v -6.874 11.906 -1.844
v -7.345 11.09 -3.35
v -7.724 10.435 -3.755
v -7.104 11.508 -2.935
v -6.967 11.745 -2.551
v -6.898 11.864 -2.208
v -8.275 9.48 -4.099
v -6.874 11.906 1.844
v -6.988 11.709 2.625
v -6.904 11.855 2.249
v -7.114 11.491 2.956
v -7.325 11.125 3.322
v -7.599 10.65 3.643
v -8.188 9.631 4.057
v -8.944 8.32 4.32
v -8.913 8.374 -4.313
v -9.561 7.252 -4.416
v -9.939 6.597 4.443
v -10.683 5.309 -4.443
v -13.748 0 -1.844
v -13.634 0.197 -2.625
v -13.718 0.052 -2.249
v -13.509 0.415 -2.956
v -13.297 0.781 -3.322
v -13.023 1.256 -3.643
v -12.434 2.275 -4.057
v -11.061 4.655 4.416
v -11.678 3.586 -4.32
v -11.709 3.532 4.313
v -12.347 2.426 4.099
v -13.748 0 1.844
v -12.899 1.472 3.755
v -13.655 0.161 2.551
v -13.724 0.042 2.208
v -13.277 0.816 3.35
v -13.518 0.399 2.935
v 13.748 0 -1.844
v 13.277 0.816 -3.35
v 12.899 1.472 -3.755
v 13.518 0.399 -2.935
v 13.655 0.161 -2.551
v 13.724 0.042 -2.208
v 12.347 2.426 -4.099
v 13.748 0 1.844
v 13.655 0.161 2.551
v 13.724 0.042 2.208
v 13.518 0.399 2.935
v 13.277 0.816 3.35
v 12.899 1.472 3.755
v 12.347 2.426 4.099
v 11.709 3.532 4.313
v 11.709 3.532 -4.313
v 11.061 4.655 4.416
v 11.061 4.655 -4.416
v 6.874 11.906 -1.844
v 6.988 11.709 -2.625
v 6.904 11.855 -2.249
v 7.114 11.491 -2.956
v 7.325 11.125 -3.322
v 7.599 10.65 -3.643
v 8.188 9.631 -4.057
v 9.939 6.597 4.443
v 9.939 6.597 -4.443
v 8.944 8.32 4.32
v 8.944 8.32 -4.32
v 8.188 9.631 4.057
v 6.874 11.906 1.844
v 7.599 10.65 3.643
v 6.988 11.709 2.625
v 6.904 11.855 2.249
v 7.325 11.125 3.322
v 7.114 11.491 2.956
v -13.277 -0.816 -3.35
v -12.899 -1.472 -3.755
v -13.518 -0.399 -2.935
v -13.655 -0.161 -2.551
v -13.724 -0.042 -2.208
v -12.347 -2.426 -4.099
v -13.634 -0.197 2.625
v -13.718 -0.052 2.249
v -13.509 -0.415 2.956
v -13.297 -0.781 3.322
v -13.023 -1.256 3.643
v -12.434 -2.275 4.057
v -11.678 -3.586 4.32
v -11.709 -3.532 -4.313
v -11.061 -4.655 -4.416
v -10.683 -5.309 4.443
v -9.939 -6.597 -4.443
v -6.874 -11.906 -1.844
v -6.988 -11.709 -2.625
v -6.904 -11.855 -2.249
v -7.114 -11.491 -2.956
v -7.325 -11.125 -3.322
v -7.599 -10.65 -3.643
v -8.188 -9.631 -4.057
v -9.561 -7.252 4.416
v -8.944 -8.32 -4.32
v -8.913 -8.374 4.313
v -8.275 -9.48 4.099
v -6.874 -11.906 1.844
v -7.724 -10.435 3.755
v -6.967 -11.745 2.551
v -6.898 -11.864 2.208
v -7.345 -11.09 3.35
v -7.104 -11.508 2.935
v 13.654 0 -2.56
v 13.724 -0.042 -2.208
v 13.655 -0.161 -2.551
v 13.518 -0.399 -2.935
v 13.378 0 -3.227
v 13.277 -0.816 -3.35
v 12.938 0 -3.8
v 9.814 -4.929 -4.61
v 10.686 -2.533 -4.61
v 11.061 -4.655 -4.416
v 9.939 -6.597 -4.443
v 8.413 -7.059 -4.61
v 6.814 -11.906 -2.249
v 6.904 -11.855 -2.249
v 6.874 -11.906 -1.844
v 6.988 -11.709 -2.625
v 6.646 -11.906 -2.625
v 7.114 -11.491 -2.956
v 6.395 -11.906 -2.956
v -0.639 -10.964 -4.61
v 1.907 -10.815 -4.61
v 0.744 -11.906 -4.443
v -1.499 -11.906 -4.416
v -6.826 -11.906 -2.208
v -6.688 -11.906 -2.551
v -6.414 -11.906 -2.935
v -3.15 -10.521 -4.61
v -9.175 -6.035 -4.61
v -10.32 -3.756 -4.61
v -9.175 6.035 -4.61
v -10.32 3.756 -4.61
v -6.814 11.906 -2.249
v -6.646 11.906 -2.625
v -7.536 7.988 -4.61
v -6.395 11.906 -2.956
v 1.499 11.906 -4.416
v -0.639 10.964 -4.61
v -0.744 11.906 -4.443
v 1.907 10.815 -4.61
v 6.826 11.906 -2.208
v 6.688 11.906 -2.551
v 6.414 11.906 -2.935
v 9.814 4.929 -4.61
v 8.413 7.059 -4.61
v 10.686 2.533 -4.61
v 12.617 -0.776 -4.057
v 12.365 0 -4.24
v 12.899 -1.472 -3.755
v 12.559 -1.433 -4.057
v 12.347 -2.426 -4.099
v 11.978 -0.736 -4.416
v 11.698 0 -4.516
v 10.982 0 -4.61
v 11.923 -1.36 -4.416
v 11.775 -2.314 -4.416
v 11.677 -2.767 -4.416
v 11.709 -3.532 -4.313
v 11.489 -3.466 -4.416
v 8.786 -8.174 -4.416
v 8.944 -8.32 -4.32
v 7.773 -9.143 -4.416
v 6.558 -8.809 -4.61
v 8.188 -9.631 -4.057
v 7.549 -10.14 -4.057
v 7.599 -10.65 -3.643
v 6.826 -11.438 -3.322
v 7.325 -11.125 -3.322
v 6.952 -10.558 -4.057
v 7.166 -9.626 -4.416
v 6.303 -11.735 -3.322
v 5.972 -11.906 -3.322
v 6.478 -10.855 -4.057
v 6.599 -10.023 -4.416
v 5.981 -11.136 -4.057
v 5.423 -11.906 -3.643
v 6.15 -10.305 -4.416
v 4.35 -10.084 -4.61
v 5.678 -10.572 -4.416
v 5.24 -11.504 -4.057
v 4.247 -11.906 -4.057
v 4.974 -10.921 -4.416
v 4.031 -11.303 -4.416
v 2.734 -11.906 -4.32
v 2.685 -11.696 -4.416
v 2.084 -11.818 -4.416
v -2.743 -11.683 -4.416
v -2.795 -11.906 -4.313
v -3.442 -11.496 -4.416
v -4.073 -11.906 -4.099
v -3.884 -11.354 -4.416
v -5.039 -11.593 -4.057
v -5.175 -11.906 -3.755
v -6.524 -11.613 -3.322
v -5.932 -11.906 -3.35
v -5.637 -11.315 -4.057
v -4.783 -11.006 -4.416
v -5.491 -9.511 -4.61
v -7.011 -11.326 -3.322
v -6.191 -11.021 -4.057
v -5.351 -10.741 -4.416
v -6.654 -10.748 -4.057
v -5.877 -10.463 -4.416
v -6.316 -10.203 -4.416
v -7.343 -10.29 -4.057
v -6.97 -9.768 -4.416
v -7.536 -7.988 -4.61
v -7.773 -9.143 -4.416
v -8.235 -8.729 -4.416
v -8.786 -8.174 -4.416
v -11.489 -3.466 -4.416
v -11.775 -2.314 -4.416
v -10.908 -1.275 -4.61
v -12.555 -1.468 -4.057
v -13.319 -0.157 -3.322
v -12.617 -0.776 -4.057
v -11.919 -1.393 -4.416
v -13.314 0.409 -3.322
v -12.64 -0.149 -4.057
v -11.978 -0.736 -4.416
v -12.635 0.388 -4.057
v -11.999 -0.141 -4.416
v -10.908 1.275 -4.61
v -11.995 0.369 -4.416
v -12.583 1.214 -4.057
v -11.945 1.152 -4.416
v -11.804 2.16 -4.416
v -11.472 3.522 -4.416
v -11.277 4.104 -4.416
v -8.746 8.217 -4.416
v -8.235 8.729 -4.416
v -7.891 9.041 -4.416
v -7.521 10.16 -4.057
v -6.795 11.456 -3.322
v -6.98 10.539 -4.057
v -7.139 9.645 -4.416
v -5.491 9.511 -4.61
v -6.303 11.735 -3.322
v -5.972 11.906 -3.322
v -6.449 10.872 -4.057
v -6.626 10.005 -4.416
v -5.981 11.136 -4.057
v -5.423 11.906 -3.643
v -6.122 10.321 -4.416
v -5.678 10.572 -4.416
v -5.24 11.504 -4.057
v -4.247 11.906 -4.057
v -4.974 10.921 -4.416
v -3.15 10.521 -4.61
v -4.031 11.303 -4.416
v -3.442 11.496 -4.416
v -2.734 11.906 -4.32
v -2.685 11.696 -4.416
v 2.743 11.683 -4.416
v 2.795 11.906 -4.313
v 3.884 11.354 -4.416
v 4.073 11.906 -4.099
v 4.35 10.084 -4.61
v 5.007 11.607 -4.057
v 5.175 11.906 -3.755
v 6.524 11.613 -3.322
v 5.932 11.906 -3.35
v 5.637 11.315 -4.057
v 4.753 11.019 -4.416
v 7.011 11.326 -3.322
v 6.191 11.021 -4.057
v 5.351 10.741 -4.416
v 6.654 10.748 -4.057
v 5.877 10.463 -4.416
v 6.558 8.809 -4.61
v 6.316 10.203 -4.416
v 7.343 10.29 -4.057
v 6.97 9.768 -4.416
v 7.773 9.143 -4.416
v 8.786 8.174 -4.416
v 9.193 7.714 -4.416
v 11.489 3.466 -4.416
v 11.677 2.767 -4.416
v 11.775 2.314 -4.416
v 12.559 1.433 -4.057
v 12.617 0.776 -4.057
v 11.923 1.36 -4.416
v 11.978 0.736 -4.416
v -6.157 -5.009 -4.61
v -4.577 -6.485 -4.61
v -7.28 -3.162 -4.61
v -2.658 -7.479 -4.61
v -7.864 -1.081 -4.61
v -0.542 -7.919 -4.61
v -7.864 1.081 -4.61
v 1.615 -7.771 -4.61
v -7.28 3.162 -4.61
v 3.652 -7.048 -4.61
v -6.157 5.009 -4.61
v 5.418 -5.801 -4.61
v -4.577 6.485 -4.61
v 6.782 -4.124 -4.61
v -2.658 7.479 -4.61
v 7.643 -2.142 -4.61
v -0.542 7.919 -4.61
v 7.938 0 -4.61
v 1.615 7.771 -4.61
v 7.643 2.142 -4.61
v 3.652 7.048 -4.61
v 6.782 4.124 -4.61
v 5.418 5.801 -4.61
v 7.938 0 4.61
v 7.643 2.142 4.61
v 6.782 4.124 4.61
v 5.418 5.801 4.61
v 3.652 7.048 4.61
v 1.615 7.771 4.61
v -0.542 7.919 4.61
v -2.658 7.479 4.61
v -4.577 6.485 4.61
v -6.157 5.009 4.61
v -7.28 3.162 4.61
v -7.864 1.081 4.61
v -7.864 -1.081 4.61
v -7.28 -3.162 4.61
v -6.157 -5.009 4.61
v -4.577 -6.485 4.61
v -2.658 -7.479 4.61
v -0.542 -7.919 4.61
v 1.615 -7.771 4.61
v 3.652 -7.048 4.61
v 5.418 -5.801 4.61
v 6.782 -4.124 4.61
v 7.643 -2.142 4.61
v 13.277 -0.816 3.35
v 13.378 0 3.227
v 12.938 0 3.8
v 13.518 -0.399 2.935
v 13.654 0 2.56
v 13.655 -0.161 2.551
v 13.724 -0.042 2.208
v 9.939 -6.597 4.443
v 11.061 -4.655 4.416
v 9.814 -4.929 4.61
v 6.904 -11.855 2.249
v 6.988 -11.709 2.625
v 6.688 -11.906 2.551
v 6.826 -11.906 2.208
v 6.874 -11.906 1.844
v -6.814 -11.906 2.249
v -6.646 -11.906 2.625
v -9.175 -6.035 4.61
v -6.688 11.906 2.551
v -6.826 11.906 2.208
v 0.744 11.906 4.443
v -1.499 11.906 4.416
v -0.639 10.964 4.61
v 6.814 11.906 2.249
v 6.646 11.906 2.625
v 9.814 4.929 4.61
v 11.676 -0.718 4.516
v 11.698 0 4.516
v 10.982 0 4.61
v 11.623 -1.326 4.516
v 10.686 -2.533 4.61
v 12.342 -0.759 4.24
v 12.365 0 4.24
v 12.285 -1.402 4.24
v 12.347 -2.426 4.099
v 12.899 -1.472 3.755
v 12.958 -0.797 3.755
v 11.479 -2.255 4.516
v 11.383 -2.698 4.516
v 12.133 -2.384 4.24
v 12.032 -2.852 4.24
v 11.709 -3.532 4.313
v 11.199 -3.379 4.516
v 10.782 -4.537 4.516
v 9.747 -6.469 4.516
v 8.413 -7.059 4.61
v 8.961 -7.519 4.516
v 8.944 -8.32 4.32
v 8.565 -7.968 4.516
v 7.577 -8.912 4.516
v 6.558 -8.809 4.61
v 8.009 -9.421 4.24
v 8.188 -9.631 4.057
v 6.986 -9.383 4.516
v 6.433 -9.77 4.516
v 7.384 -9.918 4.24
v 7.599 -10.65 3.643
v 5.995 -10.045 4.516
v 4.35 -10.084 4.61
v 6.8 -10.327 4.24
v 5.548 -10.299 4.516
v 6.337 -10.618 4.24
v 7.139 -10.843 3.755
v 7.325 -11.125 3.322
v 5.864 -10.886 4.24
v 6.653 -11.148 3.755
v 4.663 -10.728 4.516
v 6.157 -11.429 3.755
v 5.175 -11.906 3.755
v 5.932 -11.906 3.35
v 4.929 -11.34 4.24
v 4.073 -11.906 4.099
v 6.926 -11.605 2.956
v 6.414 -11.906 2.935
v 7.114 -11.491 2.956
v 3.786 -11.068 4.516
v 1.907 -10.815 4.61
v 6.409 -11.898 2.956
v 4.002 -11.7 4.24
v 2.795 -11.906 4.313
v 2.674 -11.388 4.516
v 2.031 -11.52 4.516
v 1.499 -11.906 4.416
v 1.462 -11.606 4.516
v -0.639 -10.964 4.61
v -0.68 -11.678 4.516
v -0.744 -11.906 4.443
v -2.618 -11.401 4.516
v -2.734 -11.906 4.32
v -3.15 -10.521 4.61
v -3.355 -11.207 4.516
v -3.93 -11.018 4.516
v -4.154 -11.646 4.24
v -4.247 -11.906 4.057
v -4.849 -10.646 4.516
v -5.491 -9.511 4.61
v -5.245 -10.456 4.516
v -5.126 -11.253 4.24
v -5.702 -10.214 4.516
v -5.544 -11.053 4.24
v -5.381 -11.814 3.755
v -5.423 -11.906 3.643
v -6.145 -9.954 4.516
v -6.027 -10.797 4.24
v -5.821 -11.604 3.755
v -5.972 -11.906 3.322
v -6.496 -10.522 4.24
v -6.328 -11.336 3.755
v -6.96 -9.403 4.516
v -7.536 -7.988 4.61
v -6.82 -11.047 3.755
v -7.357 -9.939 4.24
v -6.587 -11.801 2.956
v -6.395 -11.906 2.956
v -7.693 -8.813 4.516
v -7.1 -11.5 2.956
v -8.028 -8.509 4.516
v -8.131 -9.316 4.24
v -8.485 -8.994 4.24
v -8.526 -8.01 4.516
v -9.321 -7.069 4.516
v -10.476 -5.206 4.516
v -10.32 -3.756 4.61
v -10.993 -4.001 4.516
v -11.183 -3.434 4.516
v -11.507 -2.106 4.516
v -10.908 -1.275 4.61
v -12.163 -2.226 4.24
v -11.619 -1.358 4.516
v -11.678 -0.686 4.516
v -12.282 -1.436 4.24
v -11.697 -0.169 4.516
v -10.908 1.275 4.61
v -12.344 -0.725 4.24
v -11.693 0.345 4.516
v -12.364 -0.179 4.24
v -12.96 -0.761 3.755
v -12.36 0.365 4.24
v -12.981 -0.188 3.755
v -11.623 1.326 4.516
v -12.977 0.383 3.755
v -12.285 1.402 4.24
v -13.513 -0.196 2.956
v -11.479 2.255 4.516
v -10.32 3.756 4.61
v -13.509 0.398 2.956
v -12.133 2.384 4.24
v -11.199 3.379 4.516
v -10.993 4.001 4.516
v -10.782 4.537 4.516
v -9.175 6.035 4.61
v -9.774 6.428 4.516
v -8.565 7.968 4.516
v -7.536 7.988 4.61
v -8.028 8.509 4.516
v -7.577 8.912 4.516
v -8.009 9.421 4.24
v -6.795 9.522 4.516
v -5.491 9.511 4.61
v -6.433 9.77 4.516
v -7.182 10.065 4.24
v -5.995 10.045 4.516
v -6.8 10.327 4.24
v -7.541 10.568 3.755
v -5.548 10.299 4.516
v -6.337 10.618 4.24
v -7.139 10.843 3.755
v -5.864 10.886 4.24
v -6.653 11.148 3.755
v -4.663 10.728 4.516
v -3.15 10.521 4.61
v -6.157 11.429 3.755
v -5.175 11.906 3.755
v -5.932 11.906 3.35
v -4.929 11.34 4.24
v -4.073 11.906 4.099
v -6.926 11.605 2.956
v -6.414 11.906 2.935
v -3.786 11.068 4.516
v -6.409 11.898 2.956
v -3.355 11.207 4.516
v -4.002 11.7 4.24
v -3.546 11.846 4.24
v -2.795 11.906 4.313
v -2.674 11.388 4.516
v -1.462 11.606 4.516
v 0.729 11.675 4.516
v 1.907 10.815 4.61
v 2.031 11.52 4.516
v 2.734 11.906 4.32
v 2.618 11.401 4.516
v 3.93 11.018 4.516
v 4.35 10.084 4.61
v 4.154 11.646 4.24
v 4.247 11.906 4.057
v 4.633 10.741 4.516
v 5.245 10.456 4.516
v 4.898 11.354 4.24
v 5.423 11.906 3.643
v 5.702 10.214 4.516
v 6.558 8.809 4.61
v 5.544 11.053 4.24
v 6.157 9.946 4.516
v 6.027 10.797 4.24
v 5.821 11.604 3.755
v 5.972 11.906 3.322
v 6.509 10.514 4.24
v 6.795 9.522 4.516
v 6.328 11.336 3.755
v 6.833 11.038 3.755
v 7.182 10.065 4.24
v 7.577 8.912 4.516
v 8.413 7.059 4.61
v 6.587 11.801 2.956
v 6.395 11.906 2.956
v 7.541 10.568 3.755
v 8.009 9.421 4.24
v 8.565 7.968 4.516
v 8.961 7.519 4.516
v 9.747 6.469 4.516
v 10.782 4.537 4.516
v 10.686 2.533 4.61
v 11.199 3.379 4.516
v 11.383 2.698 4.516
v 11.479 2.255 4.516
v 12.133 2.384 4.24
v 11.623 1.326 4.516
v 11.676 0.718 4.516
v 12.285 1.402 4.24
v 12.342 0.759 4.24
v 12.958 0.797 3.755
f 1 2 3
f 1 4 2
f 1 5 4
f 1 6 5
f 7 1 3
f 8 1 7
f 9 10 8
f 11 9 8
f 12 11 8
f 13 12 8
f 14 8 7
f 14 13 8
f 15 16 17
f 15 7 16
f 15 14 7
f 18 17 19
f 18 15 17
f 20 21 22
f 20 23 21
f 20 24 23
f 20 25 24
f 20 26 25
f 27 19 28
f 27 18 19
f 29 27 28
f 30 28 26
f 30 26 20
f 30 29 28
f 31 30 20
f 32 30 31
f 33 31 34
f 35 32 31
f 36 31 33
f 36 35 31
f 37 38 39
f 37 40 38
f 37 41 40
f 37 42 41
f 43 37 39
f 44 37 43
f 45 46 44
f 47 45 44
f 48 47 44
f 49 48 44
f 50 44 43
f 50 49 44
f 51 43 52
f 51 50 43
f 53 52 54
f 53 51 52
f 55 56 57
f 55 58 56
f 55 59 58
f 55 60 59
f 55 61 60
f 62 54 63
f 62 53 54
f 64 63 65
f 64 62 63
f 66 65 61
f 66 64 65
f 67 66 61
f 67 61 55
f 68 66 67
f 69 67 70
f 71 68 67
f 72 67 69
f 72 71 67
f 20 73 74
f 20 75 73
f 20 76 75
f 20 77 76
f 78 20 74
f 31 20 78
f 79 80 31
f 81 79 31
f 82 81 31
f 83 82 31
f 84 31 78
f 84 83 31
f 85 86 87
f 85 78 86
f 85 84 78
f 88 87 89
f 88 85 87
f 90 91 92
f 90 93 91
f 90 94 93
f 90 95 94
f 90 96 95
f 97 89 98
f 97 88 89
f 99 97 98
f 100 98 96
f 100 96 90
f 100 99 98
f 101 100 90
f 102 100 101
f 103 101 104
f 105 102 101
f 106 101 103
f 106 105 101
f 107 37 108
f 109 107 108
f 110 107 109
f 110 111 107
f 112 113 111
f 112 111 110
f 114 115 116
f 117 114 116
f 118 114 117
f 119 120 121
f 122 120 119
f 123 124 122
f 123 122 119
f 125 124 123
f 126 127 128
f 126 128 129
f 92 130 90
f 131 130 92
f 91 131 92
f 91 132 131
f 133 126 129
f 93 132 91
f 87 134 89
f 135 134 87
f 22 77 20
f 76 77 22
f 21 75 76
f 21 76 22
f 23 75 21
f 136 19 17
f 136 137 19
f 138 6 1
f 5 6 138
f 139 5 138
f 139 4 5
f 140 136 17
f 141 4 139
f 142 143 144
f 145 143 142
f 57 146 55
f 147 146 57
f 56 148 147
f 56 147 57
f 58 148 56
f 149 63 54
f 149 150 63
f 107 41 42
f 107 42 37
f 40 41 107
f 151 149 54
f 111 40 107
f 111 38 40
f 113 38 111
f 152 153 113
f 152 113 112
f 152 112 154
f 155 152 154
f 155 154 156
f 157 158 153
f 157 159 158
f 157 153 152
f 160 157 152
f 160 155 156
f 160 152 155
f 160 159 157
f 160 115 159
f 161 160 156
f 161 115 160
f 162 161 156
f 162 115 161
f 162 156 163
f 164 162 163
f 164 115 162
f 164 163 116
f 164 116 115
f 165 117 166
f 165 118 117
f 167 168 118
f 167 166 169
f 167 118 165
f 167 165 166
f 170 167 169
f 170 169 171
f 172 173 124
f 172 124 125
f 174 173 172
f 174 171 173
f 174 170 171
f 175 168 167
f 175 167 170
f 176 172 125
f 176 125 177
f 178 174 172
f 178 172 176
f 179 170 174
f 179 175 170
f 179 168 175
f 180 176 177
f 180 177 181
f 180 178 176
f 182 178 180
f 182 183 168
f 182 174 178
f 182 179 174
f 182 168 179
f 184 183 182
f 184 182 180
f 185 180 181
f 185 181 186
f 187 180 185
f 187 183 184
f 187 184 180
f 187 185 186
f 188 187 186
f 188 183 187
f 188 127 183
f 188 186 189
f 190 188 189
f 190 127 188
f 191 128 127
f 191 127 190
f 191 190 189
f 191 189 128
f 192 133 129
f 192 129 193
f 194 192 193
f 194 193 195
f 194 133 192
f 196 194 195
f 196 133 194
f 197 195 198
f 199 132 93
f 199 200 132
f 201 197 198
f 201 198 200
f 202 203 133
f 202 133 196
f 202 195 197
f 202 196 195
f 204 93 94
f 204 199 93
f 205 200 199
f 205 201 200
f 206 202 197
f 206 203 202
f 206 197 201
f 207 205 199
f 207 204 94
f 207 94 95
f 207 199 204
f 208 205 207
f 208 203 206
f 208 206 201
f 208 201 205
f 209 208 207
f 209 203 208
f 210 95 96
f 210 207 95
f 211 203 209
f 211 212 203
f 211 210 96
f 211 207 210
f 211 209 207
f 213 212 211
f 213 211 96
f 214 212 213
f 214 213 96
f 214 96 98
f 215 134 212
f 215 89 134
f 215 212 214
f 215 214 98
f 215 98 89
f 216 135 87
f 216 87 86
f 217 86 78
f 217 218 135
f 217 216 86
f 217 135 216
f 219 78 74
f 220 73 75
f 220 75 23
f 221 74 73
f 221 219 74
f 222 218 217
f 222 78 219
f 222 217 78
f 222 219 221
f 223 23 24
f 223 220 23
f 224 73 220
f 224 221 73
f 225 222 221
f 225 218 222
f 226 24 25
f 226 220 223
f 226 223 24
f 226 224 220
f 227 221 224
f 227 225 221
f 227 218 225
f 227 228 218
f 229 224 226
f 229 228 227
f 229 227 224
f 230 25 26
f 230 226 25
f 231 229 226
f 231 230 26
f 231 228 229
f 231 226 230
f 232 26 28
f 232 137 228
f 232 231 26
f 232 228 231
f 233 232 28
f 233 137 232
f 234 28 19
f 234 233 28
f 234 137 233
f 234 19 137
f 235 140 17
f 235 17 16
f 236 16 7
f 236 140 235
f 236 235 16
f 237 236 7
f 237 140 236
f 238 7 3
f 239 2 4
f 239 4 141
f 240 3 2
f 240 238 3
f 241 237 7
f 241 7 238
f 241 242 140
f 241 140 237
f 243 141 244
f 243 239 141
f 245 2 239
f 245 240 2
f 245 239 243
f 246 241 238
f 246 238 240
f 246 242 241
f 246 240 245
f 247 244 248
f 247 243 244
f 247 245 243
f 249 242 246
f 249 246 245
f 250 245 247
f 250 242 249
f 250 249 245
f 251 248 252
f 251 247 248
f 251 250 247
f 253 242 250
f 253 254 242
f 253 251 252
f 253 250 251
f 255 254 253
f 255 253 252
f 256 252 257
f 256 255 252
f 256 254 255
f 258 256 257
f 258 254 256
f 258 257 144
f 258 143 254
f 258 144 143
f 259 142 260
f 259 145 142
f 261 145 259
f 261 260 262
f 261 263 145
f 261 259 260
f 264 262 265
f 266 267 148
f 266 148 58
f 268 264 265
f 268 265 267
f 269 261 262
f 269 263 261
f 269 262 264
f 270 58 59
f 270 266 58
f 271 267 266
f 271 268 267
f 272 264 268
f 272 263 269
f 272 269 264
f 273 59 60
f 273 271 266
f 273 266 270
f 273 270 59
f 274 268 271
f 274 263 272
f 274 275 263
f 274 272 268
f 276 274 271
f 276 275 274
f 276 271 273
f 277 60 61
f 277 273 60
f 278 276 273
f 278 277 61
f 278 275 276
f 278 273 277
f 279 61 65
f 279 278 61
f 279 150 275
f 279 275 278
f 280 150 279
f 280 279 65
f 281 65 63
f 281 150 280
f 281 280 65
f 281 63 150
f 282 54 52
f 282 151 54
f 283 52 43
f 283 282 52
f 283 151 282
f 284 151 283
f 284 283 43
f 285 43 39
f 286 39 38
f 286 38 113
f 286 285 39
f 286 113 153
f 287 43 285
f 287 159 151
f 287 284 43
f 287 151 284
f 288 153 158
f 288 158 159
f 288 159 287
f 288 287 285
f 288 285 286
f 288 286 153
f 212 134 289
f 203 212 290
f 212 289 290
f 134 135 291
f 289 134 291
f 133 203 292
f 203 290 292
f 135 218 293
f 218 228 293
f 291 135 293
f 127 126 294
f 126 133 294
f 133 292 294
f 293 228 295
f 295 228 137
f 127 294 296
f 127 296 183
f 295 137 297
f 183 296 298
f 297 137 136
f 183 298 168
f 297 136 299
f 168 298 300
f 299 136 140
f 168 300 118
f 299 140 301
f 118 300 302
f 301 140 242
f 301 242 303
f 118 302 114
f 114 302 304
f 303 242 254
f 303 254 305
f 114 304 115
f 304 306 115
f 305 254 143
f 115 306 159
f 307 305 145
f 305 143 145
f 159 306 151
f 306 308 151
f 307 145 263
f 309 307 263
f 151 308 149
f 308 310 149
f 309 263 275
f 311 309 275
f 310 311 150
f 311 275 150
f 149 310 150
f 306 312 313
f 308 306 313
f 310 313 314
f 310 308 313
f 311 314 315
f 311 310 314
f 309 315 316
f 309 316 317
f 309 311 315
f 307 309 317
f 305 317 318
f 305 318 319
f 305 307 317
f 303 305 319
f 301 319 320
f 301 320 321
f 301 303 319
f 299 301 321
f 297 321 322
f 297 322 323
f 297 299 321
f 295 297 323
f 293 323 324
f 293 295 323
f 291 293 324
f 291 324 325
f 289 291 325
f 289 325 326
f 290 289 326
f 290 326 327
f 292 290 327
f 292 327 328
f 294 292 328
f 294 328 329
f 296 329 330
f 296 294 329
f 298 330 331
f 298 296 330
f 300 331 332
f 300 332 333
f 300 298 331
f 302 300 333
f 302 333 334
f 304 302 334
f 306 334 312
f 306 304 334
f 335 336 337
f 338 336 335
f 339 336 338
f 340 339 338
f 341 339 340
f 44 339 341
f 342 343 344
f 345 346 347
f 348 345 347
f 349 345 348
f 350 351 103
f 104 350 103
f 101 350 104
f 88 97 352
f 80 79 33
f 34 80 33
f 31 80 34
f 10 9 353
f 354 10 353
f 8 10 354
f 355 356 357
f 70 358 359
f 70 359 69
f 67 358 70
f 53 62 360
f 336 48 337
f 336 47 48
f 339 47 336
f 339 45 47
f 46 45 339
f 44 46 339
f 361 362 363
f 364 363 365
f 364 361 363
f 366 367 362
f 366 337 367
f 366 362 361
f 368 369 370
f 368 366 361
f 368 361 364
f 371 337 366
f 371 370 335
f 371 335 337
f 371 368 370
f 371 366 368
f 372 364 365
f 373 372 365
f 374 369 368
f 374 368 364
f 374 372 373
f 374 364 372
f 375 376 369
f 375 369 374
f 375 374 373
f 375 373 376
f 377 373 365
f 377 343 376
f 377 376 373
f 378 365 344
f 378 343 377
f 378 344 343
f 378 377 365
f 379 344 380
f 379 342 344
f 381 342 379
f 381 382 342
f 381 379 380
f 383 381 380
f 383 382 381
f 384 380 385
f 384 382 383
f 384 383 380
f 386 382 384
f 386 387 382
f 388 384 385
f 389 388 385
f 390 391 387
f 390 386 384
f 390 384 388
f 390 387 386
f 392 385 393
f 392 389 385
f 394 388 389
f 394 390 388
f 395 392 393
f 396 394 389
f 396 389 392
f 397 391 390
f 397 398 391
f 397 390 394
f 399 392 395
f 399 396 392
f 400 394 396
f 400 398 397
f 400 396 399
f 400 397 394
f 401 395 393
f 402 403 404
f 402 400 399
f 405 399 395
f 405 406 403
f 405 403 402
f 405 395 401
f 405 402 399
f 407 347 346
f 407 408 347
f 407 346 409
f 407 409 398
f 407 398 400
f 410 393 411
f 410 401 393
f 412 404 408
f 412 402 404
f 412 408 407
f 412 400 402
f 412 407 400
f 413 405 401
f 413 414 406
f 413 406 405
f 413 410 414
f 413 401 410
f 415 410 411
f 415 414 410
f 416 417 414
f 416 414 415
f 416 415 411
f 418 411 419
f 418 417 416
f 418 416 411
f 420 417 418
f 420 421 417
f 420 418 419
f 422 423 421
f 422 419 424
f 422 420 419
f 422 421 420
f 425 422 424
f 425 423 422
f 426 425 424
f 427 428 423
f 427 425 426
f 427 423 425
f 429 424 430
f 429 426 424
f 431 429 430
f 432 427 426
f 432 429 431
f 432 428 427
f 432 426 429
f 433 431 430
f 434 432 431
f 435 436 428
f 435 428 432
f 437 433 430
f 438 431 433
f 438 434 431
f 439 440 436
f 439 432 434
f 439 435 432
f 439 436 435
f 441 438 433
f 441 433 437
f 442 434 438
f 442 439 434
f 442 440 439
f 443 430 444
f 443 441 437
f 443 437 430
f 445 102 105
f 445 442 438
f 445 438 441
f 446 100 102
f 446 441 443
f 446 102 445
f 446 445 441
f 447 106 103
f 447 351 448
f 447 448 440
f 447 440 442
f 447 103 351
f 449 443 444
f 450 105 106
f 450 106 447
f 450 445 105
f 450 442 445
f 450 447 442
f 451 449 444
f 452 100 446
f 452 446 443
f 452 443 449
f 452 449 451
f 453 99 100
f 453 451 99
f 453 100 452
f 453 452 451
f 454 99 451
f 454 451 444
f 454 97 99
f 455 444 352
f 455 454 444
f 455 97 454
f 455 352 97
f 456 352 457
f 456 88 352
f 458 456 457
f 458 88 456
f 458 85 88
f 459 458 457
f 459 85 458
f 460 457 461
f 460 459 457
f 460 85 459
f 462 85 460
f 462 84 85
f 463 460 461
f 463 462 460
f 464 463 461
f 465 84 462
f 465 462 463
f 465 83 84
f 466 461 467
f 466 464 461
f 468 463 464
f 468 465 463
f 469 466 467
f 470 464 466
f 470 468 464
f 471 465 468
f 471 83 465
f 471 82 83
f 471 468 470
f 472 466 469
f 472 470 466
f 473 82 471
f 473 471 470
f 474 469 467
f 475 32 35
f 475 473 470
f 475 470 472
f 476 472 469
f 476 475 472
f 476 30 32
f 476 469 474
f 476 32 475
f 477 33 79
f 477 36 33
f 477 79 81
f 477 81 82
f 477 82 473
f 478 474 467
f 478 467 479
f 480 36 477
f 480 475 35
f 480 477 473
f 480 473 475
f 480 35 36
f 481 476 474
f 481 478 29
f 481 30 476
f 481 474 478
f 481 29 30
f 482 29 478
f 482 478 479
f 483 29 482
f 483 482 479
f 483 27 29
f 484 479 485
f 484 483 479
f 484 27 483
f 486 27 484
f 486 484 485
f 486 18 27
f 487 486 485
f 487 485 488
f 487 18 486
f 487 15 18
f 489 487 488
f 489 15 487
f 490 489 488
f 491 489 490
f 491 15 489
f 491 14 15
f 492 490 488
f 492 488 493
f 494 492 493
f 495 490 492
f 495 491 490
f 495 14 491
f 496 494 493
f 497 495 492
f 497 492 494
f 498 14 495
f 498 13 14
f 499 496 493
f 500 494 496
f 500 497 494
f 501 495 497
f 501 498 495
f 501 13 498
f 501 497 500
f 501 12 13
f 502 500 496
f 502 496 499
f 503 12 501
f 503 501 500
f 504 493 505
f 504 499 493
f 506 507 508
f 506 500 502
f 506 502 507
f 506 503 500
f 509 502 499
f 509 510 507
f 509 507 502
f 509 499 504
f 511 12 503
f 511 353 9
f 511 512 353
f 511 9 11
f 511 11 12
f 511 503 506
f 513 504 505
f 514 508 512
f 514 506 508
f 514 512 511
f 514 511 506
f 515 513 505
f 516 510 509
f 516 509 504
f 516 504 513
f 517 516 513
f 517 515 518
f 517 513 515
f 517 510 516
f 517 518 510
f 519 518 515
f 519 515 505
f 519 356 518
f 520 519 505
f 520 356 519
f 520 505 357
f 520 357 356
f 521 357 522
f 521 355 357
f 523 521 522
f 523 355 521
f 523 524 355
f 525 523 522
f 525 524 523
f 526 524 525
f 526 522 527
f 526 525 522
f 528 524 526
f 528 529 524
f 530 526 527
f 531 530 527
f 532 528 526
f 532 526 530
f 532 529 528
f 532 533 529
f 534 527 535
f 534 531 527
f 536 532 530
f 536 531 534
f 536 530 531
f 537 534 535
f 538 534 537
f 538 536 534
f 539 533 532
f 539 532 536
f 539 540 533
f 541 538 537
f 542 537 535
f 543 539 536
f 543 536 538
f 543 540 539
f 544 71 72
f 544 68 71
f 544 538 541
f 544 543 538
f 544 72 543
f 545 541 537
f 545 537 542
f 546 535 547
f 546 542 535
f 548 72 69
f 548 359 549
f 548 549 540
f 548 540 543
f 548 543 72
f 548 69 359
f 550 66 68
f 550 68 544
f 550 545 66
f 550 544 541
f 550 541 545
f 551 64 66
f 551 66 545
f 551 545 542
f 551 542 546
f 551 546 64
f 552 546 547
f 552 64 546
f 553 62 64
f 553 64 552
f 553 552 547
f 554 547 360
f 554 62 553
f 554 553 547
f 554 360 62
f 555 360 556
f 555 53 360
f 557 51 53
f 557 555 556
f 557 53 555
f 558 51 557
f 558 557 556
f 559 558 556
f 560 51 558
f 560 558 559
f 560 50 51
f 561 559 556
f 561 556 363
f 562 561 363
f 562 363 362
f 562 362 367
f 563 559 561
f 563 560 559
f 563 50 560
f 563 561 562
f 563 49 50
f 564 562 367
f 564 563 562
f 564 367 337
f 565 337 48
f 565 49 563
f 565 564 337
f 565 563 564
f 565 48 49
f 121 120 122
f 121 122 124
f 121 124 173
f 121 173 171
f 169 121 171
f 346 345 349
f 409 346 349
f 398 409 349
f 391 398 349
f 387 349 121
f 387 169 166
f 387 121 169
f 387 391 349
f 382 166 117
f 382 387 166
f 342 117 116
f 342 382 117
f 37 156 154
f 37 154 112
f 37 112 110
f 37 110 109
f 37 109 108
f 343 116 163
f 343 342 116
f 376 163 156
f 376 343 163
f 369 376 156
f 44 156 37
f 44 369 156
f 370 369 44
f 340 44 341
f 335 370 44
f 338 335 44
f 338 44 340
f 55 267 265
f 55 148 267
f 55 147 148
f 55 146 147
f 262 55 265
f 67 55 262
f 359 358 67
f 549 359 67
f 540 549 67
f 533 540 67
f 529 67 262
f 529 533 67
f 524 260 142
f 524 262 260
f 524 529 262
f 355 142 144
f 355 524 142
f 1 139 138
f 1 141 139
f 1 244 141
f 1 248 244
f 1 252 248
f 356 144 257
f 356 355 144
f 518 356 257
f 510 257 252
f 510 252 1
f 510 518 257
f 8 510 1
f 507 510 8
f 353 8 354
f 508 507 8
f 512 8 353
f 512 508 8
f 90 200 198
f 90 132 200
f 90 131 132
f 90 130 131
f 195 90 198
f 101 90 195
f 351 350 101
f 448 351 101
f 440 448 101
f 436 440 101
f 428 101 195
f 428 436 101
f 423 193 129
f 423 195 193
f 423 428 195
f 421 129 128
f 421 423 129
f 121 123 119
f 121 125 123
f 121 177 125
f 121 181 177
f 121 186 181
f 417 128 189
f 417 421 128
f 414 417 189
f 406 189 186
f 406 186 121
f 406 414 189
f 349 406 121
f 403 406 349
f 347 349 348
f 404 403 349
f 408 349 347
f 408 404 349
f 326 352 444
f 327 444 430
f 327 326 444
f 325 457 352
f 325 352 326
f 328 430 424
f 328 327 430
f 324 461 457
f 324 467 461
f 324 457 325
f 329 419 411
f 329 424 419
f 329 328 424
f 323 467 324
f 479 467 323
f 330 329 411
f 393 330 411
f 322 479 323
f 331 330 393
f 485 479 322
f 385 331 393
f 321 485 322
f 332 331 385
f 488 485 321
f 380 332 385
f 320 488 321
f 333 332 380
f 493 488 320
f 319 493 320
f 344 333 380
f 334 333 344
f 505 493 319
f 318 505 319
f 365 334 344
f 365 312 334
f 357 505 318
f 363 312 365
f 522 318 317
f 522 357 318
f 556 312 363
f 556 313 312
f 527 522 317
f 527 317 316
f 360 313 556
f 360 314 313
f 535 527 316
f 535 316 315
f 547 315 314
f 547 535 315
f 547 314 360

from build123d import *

# Parameters (mm, degrees)
SKETCH1_R          = 7.9375
BASE_EXTRUDE_DEPTH = 4.6101


with BuildPart() as part:
    # Sketch1 → Base-Extrude (new, symmetric)
    with BuildSketch(Plane.XY):
        Polygon((13.748153285, 0), (6.874076643, 11.90625), (-6.874076643, 11.90625), (-13.748153285, 0), (-6.874076643, -11.90625), (6.874076643, -11.90625), align=None)
        Circle(SKETCH1_R, mode=Mode.SUBTRACT)
    extrude(amount=BASE_EXTRUDE_DEPTH, both=True)

    # Sketch2 → Cut-Revolve1 (revolve, cut)
    with BuildSketch(Plane(origin=(0, 0, 0), x_dir=(1, 0, 0), z_dir=(0, 1, 0))):
        with BuildLine():
            Line((13.748153285, 4.6101), (13.748153285, 1.84404))
            ThreePointArc((13.748153285, 1.84404), (12.937993068, 3.799939783), (10.982093285, 4.6101))
            Line((10.982093285, 4.6101), (13.748153285, 4.6101))
        make_face()
        with BuildLine():
            Line((13.748153285, -4.6101), (10.982093285, -4.6101))
            ThreePointArc((10.982093285, -4.6101), (12.937993068, -3.799939783), (13.748153285, -1.84404))
            Line((13.748153285, -1.84404), (13.748153285, -4.6101))
        make_face()
    revolve(axis=Axis((0, 0, 0), (0, 0, -1)), mode=Mode.SUBTRACT)


solid = part.part
